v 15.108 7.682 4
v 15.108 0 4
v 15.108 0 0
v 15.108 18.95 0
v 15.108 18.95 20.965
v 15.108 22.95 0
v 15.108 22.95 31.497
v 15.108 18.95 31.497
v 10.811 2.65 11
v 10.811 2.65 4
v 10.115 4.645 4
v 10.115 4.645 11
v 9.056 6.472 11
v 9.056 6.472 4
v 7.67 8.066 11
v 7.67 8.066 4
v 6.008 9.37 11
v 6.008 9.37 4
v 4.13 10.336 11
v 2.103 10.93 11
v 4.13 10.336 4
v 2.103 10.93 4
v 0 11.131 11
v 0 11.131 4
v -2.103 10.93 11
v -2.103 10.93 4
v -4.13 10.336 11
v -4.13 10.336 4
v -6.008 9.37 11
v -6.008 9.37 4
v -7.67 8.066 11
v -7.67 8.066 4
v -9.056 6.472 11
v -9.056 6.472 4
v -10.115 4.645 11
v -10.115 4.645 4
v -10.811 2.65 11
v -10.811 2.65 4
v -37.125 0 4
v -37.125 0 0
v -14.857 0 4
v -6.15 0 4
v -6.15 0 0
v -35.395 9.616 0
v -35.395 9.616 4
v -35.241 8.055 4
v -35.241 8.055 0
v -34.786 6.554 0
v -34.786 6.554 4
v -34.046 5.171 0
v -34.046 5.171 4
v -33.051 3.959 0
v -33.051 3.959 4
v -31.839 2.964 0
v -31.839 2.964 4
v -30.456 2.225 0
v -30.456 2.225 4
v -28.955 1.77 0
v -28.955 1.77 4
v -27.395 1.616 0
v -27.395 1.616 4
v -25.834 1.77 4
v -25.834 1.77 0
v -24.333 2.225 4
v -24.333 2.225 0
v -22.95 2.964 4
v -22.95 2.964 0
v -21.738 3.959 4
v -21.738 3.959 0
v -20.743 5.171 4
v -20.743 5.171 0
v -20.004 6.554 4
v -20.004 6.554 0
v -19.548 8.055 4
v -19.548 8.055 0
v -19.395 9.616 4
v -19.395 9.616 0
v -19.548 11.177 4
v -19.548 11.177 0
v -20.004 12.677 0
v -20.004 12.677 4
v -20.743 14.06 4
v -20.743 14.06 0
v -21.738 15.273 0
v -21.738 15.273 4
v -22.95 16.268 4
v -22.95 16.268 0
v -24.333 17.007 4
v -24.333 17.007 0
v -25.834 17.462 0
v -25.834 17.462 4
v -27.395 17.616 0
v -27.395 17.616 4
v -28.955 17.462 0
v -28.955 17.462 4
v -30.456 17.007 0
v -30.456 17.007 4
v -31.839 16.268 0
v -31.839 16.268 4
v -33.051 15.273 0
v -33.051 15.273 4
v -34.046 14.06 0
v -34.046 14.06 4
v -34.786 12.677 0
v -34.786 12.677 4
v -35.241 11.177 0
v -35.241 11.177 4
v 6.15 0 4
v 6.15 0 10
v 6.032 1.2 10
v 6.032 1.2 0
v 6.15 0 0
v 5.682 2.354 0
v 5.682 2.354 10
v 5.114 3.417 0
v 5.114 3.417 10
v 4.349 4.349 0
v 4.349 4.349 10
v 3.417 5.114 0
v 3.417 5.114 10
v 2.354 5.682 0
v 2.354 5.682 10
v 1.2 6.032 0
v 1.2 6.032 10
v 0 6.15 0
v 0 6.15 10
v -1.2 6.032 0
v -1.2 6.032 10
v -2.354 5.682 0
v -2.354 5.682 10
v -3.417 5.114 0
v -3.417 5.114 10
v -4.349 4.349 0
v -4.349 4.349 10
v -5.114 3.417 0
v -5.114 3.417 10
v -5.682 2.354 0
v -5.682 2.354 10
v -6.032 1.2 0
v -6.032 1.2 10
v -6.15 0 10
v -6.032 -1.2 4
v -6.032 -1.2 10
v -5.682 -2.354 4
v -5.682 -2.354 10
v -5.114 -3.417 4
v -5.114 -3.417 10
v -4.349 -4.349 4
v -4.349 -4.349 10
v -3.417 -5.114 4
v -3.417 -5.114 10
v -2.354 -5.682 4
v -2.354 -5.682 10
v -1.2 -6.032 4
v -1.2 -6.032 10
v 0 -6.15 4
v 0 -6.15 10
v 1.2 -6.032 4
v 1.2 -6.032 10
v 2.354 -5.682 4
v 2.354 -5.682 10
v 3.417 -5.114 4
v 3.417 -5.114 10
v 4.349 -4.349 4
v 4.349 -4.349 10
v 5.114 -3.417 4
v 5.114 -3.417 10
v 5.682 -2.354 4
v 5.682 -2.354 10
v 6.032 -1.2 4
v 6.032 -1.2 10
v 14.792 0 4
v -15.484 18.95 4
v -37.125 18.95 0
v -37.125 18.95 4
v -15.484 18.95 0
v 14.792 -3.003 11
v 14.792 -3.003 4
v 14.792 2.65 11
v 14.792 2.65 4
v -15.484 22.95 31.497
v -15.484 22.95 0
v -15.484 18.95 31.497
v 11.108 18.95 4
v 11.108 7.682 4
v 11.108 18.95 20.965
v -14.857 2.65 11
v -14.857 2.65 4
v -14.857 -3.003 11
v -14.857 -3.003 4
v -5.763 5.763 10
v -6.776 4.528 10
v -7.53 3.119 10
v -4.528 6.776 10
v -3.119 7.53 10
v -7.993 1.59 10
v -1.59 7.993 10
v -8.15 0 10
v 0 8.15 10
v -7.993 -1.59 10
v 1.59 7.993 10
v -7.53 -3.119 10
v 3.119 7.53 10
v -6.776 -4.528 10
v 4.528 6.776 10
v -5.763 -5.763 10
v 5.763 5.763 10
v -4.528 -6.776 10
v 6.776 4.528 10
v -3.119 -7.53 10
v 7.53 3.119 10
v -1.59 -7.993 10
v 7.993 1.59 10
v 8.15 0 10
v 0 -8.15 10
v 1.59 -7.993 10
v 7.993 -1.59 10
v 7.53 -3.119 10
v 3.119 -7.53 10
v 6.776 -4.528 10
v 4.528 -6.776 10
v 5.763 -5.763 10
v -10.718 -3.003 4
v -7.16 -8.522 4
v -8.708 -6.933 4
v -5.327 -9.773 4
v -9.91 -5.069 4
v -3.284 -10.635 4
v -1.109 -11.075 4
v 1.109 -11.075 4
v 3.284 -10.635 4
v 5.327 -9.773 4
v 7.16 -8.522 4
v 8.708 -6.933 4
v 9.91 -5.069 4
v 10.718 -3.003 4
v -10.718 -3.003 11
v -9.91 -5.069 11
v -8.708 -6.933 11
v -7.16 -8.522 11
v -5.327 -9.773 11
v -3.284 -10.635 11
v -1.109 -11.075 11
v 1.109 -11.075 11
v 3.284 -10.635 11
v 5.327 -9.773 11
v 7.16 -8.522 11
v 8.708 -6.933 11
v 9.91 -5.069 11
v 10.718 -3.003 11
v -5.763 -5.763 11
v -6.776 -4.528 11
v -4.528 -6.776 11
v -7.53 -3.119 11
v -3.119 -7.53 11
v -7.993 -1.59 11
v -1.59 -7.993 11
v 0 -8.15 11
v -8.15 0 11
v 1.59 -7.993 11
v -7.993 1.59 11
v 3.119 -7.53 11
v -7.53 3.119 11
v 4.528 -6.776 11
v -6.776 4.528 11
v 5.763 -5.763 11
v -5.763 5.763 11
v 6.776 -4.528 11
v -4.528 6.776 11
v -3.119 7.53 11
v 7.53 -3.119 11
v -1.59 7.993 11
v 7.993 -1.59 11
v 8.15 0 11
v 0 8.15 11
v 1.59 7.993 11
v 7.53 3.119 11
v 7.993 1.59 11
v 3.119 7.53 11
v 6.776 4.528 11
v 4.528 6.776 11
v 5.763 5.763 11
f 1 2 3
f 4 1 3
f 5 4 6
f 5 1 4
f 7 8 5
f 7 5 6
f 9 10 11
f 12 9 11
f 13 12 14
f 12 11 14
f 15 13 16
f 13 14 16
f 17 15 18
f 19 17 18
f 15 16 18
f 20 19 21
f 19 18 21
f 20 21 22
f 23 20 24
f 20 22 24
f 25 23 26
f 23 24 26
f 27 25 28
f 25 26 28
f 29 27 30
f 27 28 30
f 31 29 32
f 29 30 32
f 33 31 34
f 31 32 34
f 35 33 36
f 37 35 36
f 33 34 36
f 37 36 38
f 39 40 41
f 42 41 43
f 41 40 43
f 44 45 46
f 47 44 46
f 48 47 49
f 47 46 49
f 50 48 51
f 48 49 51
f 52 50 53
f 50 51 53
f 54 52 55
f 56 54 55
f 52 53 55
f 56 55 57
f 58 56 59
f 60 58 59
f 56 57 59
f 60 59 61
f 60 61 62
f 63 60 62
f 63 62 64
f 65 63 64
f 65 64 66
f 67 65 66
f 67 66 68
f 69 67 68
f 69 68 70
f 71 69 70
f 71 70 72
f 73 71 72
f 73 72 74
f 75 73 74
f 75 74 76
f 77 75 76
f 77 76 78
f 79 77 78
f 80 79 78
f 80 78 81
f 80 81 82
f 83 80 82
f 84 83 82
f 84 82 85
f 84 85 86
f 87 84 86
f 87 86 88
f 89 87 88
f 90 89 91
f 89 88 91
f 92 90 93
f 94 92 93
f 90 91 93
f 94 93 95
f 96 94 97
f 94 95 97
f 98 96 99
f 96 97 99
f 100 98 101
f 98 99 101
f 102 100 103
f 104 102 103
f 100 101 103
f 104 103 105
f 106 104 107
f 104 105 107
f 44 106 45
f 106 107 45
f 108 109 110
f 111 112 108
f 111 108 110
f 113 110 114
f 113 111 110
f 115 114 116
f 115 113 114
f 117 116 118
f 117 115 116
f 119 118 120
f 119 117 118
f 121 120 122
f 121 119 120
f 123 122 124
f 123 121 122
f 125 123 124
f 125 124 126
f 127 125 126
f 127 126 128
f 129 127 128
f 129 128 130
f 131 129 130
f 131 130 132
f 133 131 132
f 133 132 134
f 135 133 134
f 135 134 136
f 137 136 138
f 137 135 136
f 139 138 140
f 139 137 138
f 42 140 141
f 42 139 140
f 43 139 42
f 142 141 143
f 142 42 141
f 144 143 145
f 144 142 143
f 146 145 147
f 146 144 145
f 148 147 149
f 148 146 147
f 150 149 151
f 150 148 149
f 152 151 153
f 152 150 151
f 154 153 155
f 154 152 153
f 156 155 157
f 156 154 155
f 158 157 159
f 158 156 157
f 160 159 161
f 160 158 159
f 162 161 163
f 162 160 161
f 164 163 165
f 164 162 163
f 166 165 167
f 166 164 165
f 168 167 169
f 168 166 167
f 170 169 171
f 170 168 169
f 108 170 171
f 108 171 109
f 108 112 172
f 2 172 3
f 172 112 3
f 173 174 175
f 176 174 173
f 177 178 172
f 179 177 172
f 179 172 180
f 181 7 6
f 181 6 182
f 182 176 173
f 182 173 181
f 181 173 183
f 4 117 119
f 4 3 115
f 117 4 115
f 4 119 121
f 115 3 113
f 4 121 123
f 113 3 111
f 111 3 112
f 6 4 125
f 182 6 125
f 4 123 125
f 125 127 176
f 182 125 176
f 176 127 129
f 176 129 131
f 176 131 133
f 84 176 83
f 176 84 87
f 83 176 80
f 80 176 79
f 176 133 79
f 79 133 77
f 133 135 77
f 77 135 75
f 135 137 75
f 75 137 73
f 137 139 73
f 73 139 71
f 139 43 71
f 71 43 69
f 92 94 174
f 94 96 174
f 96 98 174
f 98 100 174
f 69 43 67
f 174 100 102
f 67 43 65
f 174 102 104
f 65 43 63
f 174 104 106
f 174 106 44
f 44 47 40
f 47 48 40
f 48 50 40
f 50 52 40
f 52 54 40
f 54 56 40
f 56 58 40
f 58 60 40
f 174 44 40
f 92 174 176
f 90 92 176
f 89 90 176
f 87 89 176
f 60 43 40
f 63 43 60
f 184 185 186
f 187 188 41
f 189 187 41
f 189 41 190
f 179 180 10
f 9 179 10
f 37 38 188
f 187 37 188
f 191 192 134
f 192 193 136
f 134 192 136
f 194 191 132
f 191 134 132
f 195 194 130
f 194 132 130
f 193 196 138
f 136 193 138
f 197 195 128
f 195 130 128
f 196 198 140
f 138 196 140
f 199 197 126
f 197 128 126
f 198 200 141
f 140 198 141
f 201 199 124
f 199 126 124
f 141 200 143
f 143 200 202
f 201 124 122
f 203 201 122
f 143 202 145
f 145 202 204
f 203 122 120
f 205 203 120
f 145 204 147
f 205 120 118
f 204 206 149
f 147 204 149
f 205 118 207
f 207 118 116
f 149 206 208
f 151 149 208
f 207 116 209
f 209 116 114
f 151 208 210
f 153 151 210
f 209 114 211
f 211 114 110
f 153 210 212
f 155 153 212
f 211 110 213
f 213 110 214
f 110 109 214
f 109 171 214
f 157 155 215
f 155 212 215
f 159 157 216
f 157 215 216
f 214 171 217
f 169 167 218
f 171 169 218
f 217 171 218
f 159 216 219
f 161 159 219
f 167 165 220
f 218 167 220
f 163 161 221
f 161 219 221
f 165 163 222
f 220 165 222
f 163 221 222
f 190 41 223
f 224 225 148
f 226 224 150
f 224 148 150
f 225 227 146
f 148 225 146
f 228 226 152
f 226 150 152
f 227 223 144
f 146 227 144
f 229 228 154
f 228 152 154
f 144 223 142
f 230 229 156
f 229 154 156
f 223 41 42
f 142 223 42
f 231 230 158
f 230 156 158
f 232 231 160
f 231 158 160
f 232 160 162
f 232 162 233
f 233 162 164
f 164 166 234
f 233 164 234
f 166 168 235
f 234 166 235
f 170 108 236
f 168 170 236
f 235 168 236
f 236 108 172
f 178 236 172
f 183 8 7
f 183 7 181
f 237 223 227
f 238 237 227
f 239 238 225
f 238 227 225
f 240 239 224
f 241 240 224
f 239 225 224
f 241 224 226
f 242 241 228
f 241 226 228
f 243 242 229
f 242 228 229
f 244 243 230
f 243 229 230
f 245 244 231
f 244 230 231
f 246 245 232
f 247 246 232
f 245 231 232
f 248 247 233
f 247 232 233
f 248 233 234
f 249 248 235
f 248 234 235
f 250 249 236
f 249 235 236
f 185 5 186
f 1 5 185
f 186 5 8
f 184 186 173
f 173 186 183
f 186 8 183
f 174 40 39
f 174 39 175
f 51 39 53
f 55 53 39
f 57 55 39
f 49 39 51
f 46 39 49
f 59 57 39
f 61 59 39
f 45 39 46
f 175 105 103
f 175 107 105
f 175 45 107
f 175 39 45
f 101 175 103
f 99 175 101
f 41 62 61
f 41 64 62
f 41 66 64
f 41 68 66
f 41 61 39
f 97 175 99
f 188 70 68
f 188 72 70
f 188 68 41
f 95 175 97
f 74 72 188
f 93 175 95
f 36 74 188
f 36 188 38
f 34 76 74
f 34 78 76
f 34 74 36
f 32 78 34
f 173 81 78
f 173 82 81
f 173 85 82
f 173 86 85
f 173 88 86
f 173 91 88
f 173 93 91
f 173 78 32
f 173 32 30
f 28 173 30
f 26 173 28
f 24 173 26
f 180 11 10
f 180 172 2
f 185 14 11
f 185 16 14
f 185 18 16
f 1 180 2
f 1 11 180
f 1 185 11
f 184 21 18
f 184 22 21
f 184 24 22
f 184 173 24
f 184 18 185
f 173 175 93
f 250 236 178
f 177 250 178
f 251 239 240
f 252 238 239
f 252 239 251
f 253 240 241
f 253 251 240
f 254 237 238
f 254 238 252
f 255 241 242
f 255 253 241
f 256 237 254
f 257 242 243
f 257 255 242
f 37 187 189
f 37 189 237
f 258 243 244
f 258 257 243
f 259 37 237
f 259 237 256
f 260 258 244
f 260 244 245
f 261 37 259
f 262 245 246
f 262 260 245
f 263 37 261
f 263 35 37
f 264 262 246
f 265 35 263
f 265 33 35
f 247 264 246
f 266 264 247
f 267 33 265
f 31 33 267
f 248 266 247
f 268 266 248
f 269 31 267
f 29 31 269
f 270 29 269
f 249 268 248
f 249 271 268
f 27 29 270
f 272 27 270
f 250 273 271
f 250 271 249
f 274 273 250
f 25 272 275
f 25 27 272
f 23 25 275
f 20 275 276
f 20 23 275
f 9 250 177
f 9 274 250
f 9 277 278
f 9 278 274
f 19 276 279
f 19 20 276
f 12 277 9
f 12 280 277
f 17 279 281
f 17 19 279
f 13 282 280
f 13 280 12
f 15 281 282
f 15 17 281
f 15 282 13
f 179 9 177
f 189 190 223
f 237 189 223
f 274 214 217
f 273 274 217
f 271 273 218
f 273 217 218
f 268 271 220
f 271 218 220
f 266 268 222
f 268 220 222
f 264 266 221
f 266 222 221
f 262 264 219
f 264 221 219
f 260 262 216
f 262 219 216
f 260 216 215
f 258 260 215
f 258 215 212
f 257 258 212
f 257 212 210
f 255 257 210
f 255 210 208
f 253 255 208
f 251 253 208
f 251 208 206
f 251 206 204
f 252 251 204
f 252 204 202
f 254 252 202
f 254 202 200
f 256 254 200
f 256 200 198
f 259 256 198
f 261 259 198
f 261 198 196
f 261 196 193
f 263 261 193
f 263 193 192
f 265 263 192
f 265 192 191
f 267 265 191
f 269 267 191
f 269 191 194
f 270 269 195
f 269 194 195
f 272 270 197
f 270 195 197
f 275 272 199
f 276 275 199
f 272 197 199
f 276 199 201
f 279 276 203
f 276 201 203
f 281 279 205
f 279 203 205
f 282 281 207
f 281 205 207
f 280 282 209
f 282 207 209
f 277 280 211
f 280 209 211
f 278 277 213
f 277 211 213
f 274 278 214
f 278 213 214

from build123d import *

# Parameters (mm, degrees)
F0_W      = 52.233020775
F0_H      = 18.9497452229
F1_DEPTH  = 4
F2_D      = 16
F4_DEPTH  = 7
F5_R      = 6.15
F6_DEPTH  = 10
F7_R      = 8.15
F8_DEPTH  = 3.72
F9_W      = 30.5920690298
F9_H      = 31.4969494939
F10_DEPTH = 4
F12_DEPTH = 4


with BuildPart() as f1:
    # F0 (on Top) → F1 (new body)
    with BuildSketch(Plane.XY):
        with Locations((-11.0083804466, 9.4748726115)):
            Rectangle(F0_W, F0_H)
    extrude(amount=F1_DEPTH)

    # F2 (through all)
    with Locations(Plane(origin=(0, 0, 0), x_dir=(1, 0, 0), z_dir=(0, 0, -1))):
        with Locations((-27.3946430534, -9.6157854423)):
            Hole(F2_D / 2)

    # F3 (on face) → F4 (join)
    with BuildSketch(Plane.XY.offset(4)):
        with BuildLine():
            Line((-10.8105310121, 2.6503070258), (-14.8572139442, 2.6503070258))
            Line((-14.8572139442, 2.6503070258), (-14.8572139442, -3.0028291512))
            Line((-14.8572139442, -3.0028291512), (-10.7179627347, -3.0028291512))
            ThreePointArc((-10.7179627347, -3.0028291512), (-11.1291732807, -0.1822366147), (-10.8105310121, 2.6503070258))
        make_face()
        with BuildLine():
            ThreePointArc((10.8105310121, 2.6503070258), (0, 11.1306652135), (-10.8105310121, 2.6503070258))
            ThreePointArc((-10.8105310121, 2.6503070258), (-11.1291732807, -0.1822366147), (-10.7179627347, -3.0028291512))
            ThreePointArc((-10.7179627347, -3.0028291512), (0, -11.1306652135), (10.7179627347, -3.0028291512))
            ThreePointArc((10.7179627347, -3.0028291512), (11.1291732807, -0.1822366147), (10.8105310121, 2.6503070258))
        make_face()
        with BuildLine():
            Line((14.7918676957, 2.6503070258), (10.8105310121, 2.6503070258))
            ThreePointArc((10.8105310121, 2.6503070258), (11.1291732807, -0.1822366147), (10.7179627347, -3.0028291512))
            Line((10.7179627347, -3.0028291512), (14.7918676957, -3.0028291512))
            Line((14.7918676957, -3.0028291512), (14.7918676957, 2.6503070258))
        make_face()
    extrude(amount=F4_DEPTH)

    # F5 (on Top) → F6 (cut)
    with BuildSketch(Plane.XY):
        Circle(F5_R)
    extrude(amount=F6_DEPTH, mode=Mode.SUBTRACT)

    # F7 (on face) → F8 (cut)
    with BuildSketch(Plane(origin=(0, 0, 10), x_dir=(1, 0, 0), z_dir=(0, 0, -1))):
        Circle(F7_R)
    extrude(amount=-F8_DEPTH, mode=Mode.SUBTRACT)

    # F9 (on face) → F10 (join)
    with BuildSketch(Plane(origin=(0, 18.9497452229, 0), x_dir=(-1, 0, 0), z_dir=(0, 1, 0))):
        with Locations((0.187904574, 15.7484747469)):
            Rectangle(F9_W, F9_H)
    extrude(amount=F10_DEPTH)

    # F11 (on face) → F12 (join)
    with BuildSketch(Plane.YZ.offset(15.1081299409)):
        Polygon((18.9497452229, 20.9649894387), (7.6817818917, 4), (18.9497452229, 4), align=None)
    extrude(amount=-F12_DEPTH)


solid = f1.part
